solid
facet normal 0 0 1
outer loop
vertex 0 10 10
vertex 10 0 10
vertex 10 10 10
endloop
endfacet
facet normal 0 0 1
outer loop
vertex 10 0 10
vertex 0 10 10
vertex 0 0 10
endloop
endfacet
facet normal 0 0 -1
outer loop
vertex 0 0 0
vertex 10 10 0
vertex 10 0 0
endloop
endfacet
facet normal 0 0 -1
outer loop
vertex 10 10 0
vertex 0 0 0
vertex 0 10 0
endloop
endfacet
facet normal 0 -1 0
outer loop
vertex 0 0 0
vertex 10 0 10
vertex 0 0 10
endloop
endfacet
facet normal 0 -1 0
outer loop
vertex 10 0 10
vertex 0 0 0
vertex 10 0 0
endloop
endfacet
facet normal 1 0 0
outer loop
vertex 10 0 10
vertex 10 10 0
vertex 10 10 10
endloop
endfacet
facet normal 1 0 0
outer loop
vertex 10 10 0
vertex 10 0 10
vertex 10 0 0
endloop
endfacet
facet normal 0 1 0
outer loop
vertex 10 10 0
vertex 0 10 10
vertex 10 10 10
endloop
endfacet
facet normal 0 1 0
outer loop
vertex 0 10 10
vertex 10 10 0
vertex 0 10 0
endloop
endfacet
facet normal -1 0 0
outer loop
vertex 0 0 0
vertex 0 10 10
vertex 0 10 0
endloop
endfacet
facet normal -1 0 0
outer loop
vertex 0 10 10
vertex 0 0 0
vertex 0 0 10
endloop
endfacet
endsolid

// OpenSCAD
// {{NAME}}.scad
//
// Workflow:
//   1. Edit your design below.
//   2. Save this file  (Cmd+S / Ctrl+S).
//   3. In FreeCAD, select the SCAD object and
//      click Render to update the 3D model.

cube([10, 10, 10]);
